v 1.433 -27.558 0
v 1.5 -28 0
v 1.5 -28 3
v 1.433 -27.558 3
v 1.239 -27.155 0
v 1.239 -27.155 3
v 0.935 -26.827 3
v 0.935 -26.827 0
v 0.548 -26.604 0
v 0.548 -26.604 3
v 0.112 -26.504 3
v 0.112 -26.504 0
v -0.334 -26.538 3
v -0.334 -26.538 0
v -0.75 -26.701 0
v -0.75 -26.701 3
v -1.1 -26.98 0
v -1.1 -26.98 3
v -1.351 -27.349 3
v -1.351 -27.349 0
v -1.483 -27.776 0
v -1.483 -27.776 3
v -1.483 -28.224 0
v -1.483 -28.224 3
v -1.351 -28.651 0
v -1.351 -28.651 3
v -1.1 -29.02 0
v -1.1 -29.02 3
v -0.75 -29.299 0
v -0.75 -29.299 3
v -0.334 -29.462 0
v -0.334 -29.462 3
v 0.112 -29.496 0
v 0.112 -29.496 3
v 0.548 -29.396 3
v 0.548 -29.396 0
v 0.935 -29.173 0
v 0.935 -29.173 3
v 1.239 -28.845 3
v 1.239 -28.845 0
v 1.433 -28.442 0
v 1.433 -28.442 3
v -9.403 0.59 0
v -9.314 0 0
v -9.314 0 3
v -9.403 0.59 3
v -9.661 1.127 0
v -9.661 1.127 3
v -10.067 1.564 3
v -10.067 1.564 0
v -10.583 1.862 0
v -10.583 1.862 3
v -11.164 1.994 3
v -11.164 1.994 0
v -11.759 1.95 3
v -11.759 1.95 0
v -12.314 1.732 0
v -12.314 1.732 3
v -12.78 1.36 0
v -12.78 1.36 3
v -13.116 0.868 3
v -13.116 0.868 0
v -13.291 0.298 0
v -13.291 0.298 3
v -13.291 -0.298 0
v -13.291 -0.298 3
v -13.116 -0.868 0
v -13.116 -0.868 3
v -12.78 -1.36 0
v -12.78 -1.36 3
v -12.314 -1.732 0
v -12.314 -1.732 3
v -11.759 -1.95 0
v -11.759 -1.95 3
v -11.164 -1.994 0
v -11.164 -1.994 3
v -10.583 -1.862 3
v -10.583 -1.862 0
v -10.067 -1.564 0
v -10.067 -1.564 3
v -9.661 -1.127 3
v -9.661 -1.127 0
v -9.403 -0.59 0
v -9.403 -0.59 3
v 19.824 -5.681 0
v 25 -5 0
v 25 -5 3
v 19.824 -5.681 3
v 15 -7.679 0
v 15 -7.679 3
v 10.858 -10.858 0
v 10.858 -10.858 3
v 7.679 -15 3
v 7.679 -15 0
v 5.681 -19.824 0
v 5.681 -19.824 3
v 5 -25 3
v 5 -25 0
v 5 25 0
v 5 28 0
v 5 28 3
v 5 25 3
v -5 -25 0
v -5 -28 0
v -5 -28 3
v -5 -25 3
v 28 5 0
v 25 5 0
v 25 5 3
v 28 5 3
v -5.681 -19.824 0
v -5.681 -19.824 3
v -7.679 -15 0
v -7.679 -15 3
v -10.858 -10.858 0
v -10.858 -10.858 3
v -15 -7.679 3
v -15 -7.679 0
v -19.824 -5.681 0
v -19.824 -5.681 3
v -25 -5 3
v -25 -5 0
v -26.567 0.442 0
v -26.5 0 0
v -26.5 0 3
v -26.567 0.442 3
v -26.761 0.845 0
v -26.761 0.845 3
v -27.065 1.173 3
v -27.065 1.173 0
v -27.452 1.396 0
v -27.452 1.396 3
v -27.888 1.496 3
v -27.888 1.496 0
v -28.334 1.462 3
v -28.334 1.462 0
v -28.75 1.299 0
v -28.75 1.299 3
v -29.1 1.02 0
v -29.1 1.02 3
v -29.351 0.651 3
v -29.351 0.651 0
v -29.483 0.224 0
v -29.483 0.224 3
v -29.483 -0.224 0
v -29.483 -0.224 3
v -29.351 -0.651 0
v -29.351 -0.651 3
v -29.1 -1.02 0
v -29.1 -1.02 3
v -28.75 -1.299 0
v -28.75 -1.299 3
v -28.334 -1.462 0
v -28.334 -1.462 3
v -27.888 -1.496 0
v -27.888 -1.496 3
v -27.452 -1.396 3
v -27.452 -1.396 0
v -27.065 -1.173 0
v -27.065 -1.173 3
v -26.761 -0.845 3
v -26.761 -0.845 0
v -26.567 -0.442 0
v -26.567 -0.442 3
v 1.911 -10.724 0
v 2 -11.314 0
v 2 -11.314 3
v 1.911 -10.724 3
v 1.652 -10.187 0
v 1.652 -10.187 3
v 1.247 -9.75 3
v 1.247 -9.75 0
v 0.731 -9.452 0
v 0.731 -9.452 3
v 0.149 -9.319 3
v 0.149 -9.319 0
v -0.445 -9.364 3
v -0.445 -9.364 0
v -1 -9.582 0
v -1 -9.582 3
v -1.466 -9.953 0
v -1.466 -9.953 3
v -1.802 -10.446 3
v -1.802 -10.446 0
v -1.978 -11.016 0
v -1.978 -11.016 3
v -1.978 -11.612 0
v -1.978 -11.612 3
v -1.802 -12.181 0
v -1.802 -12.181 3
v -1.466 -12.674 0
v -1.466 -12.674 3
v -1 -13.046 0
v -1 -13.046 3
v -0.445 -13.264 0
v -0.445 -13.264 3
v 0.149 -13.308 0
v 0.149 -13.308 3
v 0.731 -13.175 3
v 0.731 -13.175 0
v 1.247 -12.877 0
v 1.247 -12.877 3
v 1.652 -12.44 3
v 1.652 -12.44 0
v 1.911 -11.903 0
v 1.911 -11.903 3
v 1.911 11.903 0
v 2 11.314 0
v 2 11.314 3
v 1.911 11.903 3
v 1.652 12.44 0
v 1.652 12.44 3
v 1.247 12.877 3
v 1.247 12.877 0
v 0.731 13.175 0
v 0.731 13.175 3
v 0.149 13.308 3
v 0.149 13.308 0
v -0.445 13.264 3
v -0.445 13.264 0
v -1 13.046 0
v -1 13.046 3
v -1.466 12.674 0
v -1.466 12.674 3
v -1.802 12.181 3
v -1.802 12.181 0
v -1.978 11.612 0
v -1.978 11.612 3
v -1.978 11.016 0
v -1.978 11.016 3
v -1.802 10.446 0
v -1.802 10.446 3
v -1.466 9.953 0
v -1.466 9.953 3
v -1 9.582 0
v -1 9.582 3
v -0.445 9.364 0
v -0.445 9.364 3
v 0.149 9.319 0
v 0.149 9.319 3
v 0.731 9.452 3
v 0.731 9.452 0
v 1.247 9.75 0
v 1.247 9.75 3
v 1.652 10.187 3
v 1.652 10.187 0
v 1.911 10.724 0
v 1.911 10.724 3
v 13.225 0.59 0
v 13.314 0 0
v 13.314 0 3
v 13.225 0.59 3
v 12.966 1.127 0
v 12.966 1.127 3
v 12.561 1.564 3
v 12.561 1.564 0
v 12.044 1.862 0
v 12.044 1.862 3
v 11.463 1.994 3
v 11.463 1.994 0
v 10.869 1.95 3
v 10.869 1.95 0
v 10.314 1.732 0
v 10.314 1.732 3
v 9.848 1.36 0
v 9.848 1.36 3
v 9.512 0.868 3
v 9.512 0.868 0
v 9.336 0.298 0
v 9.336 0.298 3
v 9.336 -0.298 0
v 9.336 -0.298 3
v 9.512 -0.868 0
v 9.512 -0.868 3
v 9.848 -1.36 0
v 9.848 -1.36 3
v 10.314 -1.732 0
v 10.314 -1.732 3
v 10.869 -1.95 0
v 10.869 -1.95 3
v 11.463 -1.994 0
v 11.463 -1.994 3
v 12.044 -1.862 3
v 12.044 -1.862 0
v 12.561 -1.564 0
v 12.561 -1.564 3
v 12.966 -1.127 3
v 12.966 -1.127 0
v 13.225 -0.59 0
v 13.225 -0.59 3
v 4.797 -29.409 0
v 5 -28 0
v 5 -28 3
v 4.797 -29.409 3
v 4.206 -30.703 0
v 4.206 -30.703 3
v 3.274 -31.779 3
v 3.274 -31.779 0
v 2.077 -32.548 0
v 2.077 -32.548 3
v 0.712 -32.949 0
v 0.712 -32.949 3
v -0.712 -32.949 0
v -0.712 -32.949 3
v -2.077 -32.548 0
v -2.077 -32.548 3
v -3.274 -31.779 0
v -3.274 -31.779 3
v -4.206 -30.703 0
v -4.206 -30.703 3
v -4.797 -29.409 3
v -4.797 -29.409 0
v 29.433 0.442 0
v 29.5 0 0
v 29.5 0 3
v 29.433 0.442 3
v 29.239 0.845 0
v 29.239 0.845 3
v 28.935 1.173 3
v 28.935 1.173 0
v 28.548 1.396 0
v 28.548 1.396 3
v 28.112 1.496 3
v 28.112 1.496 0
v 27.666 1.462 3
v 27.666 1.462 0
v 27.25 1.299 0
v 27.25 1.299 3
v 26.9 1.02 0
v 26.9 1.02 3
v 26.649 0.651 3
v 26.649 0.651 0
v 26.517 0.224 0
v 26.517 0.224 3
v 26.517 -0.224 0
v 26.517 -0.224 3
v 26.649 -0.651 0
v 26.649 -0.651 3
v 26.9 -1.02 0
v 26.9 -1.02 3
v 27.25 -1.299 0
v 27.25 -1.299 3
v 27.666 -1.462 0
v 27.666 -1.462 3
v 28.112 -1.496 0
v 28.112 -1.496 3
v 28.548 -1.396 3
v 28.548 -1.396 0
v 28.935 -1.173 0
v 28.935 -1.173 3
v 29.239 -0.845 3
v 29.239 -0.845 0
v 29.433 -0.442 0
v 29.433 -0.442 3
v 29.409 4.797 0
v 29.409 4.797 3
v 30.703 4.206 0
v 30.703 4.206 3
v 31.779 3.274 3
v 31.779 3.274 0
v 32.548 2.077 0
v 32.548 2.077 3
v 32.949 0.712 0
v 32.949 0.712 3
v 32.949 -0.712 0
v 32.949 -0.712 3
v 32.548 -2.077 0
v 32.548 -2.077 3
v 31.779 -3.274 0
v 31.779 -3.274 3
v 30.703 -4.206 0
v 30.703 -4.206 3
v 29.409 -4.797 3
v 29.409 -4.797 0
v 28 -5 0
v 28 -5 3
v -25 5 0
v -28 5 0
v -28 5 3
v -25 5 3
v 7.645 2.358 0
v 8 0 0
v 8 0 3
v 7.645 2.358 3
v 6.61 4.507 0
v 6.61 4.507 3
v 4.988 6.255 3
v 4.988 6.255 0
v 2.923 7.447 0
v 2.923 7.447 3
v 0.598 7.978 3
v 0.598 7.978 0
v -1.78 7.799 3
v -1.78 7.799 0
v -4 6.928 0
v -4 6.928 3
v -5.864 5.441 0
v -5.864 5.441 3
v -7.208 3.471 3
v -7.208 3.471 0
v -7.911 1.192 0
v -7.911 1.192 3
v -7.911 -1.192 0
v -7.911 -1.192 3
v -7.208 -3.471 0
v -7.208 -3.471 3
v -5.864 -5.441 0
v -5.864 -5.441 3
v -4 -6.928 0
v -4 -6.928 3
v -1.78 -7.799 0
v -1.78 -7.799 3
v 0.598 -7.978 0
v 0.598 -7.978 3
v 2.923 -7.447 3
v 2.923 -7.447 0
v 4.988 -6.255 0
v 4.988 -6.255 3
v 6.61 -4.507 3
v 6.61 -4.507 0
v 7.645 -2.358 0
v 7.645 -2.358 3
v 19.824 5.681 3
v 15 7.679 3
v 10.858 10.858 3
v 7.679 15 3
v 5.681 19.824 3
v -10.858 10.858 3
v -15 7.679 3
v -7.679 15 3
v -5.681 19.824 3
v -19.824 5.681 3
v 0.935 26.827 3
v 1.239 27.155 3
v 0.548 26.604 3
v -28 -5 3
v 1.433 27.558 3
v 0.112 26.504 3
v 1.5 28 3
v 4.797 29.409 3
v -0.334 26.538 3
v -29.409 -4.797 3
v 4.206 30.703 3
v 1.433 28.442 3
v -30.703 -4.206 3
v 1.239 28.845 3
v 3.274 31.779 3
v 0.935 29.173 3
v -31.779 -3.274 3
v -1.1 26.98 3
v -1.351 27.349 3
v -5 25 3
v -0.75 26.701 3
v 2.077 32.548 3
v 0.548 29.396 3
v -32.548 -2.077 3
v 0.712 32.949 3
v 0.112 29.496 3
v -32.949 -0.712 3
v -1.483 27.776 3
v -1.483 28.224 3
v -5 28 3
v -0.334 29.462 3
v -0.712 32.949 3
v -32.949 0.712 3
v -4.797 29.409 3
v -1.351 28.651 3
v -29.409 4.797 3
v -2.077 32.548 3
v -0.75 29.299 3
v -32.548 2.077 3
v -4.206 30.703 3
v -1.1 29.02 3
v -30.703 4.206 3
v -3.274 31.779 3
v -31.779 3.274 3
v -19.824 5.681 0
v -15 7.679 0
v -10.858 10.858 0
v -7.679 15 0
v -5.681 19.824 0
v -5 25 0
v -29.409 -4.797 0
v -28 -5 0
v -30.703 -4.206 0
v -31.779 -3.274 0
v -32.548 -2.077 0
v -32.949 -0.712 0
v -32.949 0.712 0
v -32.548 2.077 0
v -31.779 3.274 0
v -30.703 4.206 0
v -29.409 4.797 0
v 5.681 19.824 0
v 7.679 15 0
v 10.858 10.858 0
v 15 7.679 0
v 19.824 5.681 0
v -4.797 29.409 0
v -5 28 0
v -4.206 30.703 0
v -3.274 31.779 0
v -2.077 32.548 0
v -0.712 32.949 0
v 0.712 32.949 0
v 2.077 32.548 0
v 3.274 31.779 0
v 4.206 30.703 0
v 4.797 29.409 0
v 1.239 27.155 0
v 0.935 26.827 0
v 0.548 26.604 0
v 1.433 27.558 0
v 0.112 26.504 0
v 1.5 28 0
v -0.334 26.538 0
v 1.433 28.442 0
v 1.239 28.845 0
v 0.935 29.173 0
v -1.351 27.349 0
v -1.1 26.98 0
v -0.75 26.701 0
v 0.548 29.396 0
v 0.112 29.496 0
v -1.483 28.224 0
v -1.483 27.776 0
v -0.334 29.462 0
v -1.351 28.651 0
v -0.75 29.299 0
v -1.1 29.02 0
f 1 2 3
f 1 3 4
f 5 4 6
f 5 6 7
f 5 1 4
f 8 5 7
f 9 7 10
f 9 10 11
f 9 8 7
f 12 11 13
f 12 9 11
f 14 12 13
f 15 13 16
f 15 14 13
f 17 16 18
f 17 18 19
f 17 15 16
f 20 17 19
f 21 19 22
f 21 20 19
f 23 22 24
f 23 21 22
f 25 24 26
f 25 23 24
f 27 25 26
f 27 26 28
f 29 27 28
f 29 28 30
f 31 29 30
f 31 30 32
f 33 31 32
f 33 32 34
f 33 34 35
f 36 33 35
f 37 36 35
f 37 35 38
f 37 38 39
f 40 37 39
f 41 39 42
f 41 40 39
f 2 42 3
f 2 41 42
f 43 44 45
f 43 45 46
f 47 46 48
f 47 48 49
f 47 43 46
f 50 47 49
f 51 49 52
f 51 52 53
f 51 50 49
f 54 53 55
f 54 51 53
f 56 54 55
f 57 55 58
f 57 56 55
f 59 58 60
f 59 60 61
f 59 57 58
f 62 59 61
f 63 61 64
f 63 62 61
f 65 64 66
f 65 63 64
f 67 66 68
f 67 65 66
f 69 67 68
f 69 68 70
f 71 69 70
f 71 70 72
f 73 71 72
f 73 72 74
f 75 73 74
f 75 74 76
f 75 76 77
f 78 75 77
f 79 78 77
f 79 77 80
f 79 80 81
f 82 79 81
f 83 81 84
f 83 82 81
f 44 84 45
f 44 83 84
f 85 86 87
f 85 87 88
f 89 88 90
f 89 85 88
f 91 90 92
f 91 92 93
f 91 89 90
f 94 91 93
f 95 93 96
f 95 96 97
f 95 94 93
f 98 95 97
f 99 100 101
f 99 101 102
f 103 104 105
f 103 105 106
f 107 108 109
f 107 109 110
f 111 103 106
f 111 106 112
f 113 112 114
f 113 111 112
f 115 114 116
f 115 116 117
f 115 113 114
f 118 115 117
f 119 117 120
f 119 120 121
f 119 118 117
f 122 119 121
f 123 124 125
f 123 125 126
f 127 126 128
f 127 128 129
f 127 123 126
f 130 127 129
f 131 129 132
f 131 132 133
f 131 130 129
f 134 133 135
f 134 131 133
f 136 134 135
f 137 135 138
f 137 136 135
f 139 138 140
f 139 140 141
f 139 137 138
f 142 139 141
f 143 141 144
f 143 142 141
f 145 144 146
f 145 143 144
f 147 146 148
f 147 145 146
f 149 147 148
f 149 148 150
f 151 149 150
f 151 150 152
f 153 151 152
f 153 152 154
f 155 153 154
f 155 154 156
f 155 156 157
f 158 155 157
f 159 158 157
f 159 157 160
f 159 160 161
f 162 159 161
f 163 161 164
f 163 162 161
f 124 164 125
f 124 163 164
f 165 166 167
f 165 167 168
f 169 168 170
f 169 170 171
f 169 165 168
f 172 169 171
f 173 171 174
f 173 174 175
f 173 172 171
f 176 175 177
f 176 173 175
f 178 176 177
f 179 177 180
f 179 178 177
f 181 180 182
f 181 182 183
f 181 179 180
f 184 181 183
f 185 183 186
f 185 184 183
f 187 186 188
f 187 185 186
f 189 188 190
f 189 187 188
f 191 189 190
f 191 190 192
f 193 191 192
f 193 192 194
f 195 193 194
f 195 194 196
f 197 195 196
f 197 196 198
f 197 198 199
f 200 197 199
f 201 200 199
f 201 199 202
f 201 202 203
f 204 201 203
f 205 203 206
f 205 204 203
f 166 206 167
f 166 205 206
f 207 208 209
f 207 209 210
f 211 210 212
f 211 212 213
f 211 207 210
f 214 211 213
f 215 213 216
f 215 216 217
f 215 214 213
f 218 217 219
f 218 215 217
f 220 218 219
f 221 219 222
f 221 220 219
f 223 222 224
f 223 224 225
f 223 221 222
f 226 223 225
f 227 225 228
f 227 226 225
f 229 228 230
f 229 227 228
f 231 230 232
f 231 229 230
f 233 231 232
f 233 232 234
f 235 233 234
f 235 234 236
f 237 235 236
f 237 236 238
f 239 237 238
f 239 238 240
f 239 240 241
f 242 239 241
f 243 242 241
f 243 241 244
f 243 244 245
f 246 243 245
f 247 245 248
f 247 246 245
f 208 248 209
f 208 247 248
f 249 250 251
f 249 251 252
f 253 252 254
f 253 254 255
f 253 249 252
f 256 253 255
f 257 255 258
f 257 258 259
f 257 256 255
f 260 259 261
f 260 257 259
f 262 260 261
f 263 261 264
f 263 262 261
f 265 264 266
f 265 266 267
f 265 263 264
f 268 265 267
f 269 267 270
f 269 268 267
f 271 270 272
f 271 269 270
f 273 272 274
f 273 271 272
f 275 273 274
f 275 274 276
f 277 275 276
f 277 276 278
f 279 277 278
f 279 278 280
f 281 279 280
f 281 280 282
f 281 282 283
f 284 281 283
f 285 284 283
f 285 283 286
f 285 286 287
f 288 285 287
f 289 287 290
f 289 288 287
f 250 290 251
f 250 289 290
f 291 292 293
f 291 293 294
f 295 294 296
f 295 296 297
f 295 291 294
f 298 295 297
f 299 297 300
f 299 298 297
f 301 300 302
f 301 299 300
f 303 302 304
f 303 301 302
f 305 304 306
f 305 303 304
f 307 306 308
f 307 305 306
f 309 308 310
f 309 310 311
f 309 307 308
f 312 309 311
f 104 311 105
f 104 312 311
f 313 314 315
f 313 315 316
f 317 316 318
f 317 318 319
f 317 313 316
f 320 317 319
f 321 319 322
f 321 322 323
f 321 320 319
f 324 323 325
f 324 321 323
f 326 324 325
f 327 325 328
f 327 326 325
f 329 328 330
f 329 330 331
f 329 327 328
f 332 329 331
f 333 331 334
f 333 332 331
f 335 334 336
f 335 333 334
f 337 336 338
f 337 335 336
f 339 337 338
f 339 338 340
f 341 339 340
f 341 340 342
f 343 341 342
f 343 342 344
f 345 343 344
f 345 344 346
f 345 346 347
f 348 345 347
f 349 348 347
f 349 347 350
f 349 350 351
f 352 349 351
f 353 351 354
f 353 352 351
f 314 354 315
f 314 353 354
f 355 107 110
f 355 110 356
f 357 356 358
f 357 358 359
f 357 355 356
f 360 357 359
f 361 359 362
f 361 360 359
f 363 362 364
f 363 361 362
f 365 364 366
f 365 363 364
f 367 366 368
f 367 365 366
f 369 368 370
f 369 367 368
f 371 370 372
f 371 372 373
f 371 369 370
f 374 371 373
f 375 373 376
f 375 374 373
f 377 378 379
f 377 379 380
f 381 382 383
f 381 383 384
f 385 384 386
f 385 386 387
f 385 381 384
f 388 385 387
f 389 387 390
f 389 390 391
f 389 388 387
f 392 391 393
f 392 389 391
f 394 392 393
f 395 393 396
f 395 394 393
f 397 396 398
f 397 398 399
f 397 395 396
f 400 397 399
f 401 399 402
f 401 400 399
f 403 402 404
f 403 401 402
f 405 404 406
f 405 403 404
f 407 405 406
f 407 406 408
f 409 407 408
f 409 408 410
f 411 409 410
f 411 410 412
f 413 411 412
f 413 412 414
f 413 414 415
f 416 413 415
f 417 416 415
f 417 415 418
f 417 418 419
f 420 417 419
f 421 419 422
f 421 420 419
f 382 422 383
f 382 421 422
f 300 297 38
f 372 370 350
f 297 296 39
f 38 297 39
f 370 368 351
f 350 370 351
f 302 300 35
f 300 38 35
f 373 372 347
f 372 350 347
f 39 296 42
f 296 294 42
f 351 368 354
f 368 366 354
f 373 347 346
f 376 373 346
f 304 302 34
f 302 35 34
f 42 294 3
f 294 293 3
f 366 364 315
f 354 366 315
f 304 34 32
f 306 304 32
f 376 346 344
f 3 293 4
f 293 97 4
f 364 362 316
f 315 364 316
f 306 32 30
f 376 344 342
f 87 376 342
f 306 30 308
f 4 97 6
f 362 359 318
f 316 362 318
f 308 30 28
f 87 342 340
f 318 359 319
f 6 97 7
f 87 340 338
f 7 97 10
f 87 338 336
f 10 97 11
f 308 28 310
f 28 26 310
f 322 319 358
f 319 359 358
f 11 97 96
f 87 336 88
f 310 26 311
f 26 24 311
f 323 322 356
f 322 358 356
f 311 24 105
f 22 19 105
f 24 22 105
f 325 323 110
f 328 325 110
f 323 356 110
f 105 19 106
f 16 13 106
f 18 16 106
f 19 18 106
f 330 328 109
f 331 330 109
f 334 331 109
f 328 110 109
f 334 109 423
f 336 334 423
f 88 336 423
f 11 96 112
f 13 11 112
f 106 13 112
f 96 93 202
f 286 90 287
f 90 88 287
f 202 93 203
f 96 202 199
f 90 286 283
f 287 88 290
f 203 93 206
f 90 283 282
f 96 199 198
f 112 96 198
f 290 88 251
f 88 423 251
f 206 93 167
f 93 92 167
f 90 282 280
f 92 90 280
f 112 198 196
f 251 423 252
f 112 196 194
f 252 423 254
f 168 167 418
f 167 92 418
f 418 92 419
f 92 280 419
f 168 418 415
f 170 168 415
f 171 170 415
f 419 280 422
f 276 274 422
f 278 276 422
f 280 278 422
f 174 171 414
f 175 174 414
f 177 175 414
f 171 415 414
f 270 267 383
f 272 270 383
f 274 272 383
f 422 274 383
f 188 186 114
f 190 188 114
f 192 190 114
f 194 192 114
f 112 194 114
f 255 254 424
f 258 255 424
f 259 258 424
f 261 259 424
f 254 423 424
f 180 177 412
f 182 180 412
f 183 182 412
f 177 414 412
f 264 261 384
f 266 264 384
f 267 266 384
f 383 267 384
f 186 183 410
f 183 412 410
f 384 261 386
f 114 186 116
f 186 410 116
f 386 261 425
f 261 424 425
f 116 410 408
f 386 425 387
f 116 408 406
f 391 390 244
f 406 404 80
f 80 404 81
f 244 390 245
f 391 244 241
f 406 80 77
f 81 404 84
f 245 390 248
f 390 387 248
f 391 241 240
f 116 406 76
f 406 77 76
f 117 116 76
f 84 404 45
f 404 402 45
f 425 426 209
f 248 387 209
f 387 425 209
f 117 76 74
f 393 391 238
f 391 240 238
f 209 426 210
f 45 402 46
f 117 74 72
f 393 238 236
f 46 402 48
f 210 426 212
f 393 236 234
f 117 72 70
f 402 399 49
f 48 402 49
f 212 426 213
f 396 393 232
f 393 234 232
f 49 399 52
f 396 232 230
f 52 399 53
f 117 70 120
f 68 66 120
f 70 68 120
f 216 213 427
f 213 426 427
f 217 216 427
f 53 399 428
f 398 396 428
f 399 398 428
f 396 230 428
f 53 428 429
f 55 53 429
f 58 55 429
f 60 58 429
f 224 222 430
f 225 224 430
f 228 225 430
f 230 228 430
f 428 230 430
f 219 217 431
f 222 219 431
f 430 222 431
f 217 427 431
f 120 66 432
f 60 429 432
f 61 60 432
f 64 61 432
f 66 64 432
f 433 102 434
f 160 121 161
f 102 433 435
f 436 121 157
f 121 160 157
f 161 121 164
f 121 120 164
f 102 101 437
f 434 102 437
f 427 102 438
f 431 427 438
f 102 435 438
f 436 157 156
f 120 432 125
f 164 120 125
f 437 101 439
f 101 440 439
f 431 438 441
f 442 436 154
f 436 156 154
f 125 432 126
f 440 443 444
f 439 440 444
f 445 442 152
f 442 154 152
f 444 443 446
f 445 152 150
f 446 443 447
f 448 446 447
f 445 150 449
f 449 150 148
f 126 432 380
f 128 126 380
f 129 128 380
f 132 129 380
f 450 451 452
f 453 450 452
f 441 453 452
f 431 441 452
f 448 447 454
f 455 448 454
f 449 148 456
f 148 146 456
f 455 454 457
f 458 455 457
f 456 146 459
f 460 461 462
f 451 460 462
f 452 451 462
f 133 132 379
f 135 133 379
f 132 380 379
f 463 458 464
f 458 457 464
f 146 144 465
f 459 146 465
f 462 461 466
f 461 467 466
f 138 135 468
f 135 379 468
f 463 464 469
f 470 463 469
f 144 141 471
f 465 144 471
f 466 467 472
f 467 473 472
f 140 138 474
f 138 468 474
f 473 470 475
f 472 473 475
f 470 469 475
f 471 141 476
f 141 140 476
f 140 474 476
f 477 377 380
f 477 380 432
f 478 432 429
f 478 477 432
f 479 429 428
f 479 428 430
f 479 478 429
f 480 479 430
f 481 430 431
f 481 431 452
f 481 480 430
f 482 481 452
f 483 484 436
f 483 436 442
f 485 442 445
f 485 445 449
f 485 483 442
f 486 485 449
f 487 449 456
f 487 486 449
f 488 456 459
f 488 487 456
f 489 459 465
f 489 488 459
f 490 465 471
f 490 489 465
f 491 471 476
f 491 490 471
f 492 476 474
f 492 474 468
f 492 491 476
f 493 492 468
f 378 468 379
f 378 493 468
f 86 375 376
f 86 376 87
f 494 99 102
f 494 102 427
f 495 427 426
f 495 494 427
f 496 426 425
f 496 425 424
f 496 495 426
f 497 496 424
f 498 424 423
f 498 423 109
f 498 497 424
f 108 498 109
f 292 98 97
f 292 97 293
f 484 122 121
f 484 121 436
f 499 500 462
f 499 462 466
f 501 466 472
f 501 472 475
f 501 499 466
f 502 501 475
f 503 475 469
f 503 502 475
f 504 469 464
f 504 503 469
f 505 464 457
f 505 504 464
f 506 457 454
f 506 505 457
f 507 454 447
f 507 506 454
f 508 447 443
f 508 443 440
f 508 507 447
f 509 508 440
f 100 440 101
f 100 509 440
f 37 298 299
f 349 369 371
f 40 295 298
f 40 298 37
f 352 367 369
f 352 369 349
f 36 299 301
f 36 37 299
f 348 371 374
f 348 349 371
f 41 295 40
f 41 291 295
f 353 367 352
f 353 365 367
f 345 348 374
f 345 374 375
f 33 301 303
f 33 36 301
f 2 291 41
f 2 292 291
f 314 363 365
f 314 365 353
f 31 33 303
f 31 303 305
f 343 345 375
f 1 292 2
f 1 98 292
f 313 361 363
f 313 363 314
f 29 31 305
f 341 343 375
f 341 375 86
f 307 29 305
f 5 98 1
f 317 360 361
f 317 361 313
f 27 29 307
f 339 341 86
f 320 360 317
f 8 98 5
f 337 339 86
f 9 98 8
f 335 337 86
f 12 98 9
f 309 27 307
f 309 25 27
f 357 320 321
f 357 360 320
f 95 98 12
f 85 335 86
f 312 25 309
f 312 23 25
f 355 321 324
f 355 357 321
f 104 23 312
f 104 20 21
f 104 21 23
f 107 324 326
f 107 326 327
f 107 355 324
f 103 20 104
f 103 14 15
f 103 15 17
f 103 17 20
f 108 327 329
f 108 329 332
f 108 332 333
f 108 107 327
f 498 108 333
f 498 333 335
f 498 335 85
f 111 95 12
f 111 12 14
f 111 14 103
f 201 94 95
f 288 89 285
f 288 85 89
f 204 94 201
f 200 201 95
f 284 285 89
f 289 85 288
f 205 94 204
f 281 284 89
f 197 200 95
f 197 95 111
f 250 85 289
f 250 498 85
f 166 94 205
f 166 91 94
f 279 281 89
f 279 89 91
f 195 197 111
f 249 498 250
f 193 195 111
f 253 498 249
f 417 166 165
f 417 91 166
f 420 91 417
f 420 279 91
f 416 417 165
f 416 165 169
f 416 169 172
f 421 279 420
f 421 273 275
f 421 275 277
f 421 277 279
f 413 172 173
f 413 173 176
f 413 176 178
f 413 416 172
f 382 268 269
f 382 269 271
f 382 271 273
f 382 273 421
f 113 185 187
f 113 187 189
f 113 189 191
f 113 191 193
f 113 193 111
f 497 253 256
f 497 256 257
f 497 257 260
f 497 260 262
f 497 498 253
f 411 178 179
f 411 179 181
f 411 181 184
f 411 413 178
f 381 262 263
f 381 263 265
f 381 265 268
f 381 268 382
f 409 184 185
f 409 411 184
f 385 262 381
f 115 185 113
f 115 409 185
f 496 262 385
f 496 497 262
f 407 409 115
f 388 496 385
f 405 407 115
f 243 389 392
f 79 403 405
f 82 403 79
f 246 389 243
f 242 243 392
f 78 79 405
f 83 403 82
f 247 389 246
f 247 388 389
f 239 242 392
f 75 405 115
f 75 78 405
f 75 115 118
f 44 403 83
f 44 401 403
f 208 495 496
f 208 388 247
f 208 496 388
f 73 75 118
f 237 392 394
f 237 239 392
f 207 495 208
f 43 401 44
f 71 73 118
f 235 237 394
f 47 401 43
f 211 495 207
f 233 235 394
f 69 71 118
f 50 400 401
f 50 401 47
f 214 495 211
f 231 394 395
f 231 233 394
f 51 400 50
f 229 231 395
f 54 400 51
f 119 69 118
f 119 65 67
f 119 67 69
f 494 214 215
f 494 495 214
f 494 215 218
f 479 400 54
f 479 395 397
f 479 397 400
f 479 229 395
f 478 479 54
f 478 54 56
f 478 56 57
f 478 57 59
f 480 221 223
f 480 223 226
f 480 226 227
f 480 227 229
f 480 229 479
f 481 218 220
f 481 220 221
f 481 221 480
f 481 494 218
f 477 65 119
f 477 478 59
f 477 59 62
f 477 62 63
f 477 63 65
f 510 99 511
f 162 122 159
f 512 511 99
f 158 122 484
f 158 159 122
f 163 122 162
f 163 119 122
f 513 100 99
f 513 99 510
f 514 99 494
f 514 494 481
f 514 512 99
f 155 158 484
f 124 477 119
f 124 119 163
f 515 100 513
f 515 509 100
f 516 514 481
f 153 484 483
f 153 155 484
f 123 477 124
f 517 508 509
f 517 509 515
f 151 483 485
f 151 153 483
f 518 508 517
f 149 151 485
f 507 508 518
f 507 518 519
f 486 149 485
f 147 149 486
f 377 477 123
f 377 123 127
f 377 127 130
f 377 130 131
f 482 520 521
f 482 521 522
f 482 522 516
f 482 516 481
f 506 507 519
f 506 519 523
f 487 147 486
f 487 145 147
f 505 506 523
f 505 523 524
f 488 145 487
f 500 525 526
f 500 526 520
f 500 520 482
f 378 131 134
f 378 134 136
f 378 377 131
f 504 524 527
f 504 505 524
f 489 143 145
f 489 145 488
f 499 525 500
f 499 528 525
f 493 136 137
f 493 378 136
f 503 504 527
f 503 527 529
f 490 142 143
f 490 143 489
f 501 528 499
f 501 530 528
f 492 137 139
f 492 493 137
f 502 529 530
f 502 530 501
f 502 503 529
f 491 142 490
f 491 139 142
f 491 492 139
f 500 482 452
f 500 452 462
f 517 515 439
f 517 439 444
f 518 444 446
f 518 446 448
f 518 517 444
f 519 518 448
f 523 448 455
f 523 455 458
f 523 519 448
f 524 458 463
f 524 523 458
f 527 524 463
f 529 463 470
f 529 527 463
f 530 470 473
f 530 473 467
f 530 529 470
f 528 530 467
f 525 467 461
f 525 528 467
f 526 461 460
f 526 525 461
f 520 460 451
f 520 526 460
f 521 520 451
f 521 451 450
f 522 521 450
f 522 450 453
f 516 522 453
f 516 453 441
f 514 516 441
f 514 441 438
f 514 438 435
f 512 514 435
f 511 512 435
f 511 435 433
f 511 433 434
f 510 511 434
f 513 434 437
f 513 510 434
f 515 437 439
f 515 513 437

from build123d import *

# Parameters (mm, degrees)
SKETCH1_R           = 1.5
SKETCH1_R_2         = 2
SKETCH1_R_3         = 8
BOSS_EXTRUDE1_DEPTH = 3


with BuildPart() as part:
    # Sketch1 → Boss-Extrude1 (new body)
    with BuildSketch(Plane.XY):
        with BuildLine():
            Line((5, 28), (5, 25))
            ThreePointArc((5, 25), (10.857864376, 10.857864376), (25, 5))
            Line((25, 5), (28, 5))
            ThreePointArc((28, 5), (33, 0), (28, -5))
            Line((28, -5), (25, -5))
            ThreePointArc((25, -5), (10.857864376, -10.857864376), (5, -25))
            Line((5, -25), (5, -28))
            ThreePointArc((5, -28), (0, -33), (-5, -28))
            Line((-5, -28), (-5, -25))
            ThreePointArc((-5, -25), (-10.857864376, -10.857864376), (-25, -5))
            Line((-25, -5), (-28, -5))
            ThreePointArc((-28, -5), (-33, 0), (-28, 5))
            Line((-28, 5), (-25, 5))
            ThreePointArc((-25, 5), (-10.857864376, 10.857864376), (-5, 25))
            Line((-5, 25), (-5, 28))
            ThreePointArc((-5, 28), (0, 33), (5, 28))
        make_face()
        with Locations((0, 28)):
            Circle(SKETCH1_R, mode=Mode.SUBTRACT)
        with Locations((28, 0)):
            Circle(SKETCH1_R, mode=Mode.SUBTRACT)
        with Locations((0, -28)):
            Circle(SKETCH1_R, mode=Mode.SUBTRACT)
        with Locations((-28, 0)):
            Circle(SKETCH1_R, mode=Mode.SUBTRACT)
        with Locations((0, -11.313708499)):
            Circle(SKETCH1_R_2, mode=Mode.SUBTRACT)
        with Locations((-11.313708499, 0)):
            Circle(SKETCH1_R_2, mode=Mode.SUBTRACT)
        with Locations((0, 11.313708499)):
            Circle(SKETCH1_R_2, mode=Mode.SUBTRACT)
        with Locations((11.313708499, 0)):
            Circle(SKETCH1_R_2, mode=Mode.SUBTRACT)
        Circle(SKETCH1_R_3, mode=Mode.SUBTRACT)
    extrude(amount=BOSS_EXTRUDE1_DEPTH)


solid = part.part
